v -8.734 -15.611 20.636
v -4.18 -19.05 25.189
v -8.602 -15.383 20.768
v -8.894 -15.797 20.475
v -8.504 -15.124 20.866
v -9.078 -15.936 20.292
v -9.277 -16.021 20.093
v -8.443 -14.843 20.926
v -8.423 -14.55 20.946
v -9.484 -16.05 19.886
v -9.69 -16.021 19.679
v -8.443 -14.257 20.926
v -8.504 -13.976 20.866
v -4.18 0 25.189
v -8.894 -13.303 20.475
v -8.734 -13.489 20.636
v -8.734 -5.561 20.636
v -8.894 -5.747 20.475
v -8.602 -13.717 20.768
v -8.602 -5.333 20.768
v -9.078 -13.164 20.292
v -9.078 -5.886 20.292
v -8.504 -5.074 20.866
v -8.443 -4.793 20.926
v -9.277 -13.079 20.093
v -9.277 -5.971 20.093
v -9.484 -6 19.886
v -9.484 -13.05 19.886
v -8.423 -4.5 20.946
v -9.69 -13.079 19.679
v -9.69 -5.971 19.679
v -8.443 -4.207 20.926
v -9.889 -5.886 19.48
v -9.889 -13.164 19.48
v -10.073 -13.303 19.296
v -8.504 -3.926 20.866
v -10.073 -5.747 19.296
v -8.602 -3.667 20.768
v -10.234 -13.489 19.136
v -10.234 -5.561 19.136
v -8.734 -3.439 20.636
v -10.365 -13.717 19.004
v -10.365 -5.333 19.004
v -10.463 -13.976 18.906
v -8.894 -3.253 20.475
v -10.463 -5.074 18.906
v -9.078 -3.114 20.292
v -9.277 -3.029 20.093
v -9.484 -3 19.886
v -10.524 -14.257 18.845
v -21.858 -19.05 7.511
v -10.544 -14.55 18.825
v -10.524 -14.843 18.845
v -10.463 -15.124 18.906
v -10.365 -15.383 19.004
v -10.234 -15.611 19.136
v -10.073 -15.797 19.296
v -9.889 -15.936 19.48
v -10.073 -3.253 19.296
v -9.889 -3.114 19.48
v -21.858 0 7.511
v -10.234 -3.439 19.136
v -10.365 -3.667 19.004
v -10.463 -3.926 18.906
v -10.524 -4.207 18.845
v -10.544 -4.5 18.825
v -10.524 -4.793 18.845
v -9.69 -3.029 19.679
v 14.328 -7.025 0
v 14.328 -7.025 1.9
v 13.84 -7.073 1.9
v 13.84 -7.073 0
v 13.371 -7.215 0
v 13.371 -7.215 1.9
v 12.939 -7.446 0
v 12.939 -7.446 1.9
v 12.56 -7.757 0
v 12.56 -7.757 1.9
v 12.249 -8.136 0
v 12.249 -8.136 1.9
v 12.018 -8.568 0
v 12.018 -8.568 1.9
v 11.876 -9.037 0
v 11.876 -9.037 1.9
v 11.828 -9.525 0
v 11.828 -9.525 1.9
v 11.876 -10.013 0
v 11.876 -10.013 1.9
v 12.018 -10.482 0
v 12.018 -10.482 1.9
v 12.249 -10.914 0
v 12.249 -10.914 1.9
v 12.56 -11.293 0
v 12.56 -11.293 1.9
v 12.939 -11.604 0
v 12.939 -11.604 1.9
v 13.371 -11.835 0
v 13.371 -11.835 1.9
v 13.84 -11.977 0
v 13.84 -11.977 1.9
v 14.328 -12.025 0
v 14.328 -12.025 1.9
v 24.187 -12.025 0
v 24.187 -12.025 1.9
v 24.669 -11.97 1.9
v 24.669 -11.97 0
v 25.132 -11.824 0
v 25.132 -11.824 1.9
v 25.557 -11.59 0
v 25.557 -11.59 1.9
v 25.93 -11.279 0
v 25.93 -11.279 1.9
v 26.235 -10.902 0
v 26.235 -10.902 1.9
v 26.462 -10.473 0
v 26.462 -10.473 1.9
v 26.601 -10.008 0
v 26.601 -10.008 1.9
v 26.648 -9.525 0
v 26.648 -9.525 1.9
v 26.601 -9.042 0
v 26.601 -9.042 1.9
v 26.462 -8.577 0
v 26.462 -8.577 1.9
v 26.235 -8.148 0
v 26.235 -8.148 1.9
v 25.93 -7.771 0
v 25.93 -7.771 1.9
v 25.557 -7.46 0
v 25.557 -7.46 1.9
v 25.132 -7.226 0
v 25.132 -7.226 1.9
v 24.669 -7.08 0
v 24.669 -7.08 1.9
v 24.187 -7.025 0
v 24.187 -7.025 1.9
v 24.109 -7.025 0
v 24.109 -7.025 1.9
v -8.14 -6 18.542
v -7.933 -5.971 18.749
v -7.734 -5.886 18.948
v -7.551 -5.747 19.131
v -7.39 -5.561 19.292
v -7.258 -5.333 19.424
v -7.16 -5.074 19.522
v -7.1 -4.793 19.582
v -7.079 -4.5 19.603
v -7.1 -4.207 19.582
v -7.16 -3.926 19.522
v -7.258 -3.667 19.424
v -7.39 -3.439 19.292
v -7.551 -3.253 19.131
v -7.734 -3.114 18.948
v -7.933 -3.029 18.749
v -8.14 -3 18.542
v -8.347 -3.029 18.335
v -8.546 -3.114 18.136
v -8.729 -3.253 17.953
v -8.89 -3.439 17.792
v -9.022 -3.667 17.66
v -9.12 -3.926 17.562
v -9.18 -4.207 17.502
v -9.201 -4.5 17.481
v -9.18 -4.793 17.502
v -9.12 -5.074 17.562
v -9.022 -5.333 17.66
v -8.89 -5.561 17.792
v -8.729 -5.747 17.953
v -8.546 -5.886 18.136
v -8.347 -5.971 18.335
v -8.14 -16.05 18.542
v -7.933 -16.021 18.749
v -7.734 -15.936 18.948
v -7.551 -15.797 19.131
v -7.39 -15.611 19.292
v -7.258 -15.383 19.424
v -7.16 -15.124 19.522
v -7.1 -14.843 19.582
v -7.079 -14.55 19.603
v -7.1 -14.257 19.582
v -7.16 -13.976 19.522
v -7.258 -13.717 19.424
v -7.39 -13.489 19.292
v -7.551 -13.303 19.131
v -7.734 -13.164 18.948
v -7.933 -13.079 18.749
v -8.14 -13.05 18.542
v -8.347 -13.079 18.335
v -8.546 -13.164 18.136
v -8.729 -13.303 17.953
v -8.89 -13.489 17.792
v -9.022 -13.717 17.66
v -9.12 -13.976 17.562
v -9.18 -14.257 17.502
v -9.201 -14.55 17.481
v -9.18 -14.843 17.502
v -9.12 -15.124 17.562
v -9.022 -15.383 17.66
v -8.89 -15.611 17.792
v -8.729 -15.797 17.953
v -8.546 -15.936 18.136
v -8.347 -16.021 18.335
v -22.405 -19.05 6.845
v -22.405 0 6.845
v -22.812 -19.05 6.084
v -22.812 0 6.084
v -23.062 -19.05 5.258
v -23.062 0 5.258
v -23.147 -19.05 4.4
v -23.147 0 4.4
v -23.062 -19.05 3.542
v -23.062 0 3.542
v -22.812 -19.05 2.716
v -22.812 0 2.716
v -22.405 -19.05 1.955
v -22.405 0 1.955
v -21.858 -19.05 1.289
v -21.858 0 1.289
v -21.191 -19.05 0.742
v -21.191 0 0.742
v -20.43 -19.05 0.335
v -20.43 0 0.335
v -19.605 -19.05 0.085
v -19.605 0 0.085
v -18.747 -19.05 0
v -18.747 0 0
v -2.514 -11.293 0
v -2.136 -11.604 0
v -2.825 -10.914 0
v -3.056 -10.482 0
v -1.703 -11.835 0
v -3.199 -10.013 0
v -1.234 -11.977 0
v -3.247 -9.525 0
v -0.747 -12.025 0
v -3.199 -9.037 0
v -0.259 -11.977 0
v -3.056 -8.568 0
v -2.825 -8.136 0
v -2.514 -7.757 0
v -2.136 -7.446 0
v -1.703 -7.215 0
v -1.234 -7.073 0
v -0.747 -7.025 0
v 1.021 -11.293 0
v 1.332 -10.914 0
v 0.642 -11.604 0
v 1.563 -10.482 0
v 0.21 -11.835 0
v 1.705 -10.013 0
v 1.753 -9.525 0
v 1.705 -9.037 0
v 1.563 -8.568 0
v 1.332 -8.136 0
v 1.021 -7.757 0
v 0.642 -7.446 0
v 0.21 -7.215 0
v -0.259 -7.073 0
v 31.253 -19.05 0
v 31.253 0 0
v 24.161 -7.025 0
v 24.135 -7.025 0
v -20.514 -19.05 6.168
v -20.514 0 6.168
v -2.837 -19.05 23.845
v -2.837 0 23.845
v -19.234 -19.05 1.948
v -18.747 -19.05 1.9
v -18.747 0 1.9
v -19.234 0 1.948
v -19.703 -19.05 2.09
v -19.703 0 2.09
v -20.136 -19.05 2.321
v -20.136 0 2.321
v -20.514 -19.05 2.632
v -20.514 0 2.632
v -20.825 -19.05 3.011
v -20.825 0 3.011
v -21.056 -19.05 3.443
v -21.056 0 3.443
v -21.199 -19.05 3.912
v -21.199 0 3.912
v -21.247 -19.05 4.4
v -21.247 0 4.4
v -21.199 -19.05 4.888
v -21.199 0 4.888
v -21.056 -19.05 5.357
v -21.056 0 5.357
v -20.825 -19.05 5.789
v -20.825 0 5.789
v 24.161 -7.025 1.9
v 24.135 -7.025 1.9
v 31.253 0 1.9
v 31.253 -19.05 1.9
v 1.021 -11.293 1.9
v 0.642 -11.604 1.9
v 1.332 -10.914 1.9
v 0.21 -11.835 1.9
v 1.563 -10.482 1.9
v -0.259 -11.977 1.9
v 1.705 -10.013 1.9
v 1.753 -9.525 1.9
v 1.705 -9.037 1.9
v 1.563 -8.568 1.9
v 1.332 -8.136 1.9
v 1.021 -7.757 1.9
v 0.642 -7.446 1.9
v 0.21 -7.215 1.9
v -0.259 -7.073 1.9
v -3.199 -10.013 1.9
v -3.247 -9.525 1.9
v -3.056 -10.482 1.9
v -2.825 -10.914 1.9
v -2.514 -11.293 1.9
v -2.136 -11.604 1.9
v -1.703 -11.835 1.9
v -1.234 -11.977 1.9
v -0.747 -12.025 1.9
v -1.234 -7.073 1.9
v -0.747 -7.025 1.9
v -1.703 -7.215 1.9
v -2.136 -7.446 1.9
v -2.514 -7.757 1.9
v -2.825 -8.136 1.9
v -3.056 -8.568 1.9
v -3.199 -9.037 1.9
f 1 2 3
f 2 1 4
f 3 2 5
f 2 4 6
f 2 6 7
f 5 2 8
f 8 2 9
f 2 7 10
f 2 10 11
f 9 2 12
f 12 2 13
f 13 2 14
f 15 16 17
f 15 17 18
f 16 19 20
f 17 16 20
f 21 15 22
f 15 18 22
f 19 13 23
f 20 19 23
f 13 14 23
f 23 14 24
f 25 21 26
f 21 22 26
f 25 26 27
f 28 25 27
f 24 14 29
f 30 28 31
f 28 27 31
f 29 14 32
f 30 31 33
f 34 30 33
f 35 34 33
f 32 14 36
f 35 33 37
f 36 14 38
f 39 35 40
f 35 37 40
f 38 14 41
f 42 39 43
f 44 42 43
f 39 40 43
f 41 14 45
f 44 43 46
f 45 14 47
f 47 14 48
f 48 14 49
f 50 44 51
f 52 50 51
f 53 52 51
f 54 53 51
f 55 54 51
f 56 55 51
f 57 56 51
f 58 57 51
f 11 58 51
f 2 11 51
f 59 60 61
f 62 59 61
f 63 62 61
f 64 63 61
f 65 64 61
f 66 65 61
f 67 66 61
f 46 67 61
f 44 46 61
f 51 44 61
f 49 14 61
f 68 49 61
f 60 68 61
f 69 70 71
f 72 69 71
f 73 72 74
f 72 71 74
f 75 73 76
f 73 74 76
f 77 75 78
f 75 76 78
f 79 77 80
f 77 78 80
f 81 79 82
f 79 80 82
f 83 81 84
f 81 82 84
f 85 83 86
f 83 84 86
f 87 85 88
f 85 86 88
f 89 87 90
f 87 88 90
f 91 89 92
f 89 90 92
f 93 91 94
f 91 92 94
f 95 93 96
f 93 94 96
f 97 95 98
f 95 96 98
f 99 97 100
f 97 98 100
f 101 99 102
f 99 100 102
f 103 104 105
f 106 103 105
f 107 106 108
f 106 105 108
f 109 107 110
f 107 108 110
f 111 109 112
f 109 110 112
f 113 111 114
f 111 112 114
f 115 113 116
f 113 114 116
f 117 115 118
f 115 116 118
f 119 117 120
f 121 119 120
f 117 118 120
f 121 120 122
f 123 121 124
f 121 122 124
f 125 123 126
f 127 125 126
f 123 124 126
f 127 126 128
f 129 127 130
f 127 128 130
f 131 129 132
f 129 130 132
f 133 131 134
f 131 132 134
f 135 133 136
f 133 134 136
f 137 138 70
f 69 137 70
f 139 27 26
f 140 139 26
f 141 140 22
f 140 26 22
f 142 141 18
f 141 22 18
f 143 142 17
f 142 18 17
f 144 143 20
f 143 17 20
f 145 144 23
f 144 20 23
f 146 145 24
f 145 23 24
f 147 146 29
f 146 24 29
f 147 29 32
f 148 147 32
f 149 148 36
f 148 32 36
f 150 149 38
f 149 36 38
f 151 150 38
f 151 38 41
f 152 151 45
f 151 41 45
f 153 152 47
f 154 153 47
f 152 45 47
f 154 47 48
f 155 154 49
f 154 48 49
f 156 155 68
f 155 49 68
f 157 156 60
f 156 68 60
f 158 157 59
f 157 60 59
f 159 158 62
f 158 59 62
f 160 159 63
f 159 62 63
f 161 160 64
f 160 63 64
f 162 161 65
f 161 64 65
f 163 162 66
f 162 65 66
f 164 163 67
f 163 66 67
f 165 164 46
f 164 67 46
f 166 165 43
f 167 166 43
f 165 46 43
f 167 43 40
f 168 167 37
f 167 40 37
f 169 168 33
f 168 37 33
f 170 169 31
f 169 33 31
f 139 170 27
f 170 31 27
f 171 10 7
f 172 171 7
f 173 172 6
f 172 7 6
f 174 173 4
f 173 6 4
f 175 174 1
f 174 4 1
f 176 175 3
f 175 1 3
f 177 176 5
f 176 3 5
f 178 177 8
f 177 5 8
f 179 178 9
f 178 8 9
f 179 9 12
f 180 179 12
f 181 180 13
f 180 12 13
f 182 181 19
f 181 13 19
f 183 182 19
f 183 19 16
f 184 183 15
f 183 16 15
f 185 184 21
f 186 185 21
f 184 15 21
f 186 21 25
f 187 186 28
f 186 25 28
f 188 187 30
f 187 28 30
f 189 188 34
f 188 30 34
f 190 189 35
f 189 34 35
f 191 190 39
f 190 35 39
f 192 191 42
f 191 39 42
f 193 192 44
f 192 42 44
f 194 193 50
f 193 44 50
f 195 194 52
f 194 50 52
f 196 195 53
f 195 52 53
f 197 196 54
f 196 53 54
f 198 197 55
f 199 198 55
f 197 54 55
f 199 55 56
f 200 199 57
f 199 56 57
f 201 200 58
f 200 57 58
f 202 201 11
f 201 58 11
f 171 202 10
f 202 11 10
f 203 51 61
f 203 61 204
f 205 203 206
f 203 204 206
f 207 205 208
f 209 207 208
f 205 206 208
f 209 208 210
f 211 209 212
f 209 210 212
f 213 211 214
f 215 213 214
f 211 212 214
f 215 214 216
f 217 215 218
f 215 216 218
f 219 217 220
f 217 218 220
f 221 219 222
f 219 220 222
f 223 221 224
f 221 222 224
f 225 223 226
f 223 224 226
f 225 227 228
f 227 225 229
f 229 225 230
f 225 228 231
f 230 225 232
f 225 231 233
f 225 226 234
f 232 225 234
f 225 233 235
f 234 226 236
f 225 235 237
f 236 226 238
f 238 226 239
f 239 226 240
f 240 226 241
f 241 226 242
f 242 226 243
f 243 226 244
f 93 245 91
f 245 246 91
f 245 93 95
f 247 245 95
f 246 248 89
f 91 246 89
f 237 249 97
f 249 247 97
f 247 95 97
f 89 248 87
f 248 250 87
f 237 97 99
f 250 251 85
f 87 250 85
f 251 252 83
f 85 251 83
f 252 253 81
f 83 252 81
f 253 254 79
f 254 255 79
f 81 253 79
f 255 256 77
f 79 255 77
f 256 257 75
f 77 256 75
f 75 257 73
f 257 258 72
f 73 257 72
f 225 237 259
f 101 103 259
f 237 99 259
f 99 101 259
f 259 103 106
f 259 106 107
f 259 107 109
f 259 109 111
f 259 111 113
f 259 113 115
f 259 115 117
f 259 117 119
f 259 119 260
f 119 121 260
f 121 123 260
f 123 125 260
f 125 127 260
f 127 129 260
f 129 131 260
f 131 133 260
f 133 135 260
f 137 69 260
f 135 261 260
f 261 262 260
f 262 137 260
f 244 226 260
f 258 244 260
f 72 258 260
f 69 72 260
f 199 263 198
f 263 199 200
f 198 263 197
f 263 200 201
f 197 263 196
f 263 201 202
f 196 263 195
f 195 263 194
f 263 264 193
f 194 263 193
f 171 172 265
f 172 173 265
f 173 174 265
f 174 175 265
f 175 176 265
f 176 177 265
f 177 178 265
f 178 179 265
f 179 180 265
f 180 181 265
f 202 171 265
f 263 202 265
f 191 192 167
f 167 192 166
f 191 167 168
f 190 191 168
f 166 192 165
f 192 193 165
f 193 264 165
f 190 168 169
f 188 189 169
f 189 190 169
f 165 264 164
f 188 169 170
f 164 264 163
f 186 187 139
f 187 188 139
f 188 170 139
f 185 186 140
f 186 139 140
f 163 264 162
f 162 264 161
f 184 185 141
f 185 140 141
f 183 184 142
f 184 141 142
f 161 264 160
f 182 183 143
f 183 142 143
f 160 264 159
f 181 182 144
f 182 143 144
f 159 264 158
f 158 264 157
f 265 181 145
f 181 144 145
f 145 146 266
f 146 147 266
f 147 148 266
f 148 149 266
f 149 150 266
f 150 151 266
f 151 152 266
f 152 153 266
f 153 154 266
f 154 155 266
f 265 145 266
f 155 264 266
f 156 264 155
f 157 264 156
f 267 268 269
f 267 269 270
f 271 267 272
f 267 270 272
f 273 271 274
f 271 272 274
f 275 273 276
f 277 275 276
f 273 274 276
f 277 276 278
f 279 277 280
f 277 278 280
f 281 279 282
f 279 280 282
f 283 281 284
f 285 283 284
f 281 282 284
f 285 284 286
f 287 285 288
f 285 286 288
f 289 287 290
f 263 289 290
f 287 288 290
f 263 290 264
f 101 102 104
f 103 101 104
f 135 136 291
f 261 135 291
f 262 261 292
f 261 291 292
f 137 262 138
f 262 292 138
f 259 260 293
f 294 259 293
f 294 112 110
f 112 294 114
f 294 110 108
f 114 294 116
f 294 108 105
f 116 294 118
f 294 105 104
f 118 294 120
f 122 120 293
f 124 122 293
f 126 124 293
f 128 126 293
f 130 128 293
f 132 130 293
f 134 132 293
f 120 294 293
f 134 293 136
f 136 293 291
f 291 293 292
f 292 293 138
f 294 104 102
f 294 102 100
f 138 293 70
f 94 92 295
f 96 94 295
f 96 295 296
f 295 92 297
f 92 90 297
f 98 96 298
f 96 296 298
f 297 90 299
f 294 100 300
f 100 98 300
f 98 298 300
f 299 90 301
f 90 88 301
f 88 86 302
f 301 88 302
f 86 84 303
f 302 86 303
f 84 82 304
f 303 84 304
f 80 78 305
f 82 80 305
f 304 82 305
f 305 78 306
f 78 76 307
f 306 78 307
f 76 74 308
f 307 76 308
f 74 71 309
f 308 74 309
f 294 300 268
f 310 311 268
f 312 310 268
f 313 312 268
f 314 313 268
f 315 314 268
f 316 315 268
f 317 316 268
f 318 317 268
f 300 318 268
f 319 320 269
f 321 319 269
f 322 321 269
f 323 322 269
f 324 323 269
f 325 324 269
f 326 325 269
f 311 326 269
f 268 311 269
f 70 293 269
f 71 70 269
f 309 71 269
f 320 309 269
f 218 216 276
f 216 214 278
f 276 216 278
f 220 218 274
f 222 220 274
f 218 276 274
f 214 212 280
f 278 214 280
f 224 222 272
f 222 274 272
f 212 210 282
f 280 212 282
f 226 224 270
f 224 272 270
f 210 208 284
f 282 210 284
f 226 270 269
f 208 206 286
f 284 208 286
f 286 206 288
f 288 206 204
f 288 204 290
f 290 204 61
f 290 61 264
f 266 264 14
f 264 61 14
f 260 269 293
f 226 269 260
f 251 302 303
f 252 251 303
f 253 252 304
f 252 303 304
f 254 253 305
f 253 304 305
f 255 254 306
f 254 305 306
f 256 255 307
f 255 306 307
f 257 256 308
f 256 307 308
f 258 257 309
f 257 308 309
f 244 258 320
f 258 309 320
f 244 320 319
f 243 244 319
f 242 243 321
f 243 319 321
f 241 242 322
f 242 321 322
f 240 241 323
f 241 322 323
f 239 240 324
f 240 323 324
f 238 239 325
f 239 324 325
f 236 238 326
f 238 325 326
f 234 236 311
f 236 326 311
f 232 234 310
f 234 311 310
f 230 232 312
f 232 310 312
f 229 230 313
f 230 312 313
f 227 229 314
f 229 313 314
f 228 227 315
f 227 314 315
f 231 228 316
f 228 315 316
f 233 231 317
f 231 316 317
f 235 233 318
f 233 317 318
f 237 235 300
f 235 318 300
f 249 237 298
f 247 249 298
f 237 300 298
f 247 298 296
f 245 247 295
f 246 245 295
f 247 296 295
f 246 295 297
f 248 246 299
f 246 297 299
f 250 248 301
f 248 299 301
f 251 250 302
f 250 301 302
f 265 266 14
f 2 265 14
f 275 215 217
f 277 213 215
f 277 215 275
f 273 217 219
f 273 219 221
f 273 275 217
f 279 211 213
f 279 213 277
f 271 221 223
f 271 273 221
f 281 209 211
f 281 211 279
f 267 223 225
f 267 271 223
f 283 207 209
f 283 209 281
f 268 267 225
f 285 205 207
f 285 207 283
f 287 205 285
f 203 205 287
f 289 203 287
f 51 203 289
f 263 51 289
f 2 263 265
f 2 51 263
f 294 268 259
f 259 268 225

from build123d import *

# Parameters (mm, degrees)
F1_DEPTH = 19.05
F2_R     = 2.5
F3_DEPTH = 1.9
F4_R     = 1.5
F5_DEPTH = 1.9


with BuildPart() as f1:
    # F0 (on Front) → F1 (new body)
    with BuildSketch(Plane.XZ):
        with BuildLine():
            Line((-18.746637599, 0), (31.253362401, 0))
            Line((31.253362401, 0), (31.253362401, 1.9))
            Line((31.253362401, 1.9), (-18.746637599, 1.9))
            ThreePointArc((-18.746637599, 1.9), (-21.0563364303, 3.4432914191), (-20.514404552, 6.167766953))
            Line((-20.514404552, 6.167766953), (-2.8367350223, 23.8454364826))
            Line((-2.8367350223, 23.8454364826), (-4.1802379066, 25.1889393669))
            Line((-4.1802379066, 25.1889393669), (-21.8579074362, 7.5112698372))
            ThreePointArc((-21.8579074362, 7.5112698372), (-22.8117075421, 2.7161928976), (-18.746637599, 0))
        make_face()
    extrude(amount=F1_DEPTH)

    # F2 (on face) → F3 (cut, through all)
    with BuildSketch(Plane.XY.offset(1.9)):
        with Locations((-0.746637599, -9.525)):
            Circle(F2_R)
        with BuildLine():
            ThreePointArc((24.1869203746, -12.025), (26.6482556642, -9.525), (24.1869203746, -7.025))
            Line((24.1869203746, -7.025), (24.1089835763, -7.025))
            Line((24.1089835763, -7.025), (14.3277980387, -7.025))
            ThreePointArc((14.3277980387, -7.025), (11.8277980387, -9.525), (14.3277980387, -12.025))
            Line((14.3277980387, -12.025), (24.1869203746, -12.025))
        make_face()
        with BuildLine():
            Line((24.1089835763, -7.025), (24.1869203746, -7.025))
            ThreePointArc((24.1869203746, -7.025), (24.1479519755, -7.0246963112), (24.1089835763, -7.025))
        make_face()
    extrude(amount=-F3_DEPTH, mode=Mode.SUBTRACT)

    # F4 (on face) → F5 (cut, through all)
    with BuildSketch(Plane(origin=(-14.6845886367, 0, 14.6845886367), x_dir=(0, -1, 0), z_dir=(-0.7071067812, 0, 0.7071067812))):
        with Locations((14.55, 7.3553952665)):
            Circle(F4_R)
        with Locations((4.5, 7.3553952665)):
            Circle(F4_R)
    extrude(amount=-F5_DEPTH, mode=Mode.SUBTRACT)


solid = f1.part
